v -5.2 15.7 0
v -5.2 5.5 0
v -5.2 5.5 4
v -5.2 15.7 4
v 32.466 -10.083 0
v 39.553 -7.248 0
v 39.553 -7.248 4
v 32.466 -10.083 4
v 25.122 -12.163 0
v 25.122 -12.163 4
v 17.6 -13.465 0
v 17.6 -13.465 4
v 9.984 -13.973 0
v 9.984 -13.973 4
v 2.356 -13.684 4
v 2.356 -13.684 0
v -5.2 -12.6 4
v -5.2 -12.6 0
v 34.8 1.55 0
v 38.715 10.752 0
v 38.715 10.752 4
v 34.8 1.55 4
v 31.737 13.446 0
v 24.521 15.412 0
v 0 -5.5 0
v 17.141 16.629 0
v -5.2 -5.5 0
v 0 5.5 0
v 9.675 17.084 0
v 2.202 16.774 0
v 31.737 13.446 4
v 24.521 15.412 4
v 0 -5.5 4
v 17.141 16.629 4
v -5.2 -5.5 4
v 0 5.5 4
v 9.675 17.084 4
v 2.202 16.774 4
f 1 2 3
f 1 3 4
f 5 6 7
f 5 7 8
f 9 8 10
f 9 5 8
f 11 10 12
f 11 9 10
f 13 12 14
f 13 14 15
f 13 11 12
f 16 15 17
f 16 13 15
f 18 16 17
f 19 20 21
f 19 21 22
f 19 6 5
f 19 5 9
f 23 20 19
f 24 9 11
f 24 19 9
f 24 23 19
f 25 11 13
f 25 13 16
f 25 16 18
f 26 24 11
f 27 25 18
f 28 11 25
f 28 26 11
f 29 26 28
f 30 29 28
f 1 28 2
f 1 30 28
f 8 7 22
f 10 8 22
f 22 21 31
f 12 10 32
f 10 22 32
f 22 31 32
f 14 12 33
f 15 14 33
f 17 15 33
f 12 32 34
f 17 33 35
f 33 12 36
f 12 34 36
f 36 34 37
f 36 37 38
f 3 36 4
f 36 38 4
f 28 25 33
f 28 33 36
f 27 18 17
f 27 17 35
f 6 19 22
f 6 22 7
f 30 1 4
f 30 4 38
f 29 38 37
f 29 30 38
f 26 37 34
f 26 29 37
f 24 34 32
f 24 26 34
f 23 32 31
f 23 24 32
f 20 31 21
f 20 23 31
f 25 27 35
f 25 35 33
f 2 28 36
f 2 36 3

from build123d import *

# Parameters (mm, degrees)
BOSS_EXTRUDE1_DEPTH = 4


with BuildPart() as part:
    # Sketch1 → Boss-Extrude1 (new body)
    with BuildSketch(Plane.XY):
        with BuildLine():
            Line((0, 5.5), (-5.2, 5.5))
            Line((-5.2, 5.5), (-5.2, 15.7))
            ThreePointArc((-5.2, 15.7), (17.140820884, 16.628890564), (38.714781823, 10.751873901))
            Line((38.714781823, 10.751873901), (34.8, 1.55))
            Line((34.8, 1.55), (39.553207037, -7.248126099))
            ThreePointArc((39.553207037, -7.248126099), (17.599991723, -13.46450147), (-5.2, -12.6))
            Line((-5.2, -12.6), (-5.2, -5.5))
            Line((-5.2, -5.5), (0, -5.5))
            Line((0, -5.5), (0, 5.5))
        make_face()
    extrude(amount=BOSS_EXTRUDE1_DEPTH)


solid = part.part
